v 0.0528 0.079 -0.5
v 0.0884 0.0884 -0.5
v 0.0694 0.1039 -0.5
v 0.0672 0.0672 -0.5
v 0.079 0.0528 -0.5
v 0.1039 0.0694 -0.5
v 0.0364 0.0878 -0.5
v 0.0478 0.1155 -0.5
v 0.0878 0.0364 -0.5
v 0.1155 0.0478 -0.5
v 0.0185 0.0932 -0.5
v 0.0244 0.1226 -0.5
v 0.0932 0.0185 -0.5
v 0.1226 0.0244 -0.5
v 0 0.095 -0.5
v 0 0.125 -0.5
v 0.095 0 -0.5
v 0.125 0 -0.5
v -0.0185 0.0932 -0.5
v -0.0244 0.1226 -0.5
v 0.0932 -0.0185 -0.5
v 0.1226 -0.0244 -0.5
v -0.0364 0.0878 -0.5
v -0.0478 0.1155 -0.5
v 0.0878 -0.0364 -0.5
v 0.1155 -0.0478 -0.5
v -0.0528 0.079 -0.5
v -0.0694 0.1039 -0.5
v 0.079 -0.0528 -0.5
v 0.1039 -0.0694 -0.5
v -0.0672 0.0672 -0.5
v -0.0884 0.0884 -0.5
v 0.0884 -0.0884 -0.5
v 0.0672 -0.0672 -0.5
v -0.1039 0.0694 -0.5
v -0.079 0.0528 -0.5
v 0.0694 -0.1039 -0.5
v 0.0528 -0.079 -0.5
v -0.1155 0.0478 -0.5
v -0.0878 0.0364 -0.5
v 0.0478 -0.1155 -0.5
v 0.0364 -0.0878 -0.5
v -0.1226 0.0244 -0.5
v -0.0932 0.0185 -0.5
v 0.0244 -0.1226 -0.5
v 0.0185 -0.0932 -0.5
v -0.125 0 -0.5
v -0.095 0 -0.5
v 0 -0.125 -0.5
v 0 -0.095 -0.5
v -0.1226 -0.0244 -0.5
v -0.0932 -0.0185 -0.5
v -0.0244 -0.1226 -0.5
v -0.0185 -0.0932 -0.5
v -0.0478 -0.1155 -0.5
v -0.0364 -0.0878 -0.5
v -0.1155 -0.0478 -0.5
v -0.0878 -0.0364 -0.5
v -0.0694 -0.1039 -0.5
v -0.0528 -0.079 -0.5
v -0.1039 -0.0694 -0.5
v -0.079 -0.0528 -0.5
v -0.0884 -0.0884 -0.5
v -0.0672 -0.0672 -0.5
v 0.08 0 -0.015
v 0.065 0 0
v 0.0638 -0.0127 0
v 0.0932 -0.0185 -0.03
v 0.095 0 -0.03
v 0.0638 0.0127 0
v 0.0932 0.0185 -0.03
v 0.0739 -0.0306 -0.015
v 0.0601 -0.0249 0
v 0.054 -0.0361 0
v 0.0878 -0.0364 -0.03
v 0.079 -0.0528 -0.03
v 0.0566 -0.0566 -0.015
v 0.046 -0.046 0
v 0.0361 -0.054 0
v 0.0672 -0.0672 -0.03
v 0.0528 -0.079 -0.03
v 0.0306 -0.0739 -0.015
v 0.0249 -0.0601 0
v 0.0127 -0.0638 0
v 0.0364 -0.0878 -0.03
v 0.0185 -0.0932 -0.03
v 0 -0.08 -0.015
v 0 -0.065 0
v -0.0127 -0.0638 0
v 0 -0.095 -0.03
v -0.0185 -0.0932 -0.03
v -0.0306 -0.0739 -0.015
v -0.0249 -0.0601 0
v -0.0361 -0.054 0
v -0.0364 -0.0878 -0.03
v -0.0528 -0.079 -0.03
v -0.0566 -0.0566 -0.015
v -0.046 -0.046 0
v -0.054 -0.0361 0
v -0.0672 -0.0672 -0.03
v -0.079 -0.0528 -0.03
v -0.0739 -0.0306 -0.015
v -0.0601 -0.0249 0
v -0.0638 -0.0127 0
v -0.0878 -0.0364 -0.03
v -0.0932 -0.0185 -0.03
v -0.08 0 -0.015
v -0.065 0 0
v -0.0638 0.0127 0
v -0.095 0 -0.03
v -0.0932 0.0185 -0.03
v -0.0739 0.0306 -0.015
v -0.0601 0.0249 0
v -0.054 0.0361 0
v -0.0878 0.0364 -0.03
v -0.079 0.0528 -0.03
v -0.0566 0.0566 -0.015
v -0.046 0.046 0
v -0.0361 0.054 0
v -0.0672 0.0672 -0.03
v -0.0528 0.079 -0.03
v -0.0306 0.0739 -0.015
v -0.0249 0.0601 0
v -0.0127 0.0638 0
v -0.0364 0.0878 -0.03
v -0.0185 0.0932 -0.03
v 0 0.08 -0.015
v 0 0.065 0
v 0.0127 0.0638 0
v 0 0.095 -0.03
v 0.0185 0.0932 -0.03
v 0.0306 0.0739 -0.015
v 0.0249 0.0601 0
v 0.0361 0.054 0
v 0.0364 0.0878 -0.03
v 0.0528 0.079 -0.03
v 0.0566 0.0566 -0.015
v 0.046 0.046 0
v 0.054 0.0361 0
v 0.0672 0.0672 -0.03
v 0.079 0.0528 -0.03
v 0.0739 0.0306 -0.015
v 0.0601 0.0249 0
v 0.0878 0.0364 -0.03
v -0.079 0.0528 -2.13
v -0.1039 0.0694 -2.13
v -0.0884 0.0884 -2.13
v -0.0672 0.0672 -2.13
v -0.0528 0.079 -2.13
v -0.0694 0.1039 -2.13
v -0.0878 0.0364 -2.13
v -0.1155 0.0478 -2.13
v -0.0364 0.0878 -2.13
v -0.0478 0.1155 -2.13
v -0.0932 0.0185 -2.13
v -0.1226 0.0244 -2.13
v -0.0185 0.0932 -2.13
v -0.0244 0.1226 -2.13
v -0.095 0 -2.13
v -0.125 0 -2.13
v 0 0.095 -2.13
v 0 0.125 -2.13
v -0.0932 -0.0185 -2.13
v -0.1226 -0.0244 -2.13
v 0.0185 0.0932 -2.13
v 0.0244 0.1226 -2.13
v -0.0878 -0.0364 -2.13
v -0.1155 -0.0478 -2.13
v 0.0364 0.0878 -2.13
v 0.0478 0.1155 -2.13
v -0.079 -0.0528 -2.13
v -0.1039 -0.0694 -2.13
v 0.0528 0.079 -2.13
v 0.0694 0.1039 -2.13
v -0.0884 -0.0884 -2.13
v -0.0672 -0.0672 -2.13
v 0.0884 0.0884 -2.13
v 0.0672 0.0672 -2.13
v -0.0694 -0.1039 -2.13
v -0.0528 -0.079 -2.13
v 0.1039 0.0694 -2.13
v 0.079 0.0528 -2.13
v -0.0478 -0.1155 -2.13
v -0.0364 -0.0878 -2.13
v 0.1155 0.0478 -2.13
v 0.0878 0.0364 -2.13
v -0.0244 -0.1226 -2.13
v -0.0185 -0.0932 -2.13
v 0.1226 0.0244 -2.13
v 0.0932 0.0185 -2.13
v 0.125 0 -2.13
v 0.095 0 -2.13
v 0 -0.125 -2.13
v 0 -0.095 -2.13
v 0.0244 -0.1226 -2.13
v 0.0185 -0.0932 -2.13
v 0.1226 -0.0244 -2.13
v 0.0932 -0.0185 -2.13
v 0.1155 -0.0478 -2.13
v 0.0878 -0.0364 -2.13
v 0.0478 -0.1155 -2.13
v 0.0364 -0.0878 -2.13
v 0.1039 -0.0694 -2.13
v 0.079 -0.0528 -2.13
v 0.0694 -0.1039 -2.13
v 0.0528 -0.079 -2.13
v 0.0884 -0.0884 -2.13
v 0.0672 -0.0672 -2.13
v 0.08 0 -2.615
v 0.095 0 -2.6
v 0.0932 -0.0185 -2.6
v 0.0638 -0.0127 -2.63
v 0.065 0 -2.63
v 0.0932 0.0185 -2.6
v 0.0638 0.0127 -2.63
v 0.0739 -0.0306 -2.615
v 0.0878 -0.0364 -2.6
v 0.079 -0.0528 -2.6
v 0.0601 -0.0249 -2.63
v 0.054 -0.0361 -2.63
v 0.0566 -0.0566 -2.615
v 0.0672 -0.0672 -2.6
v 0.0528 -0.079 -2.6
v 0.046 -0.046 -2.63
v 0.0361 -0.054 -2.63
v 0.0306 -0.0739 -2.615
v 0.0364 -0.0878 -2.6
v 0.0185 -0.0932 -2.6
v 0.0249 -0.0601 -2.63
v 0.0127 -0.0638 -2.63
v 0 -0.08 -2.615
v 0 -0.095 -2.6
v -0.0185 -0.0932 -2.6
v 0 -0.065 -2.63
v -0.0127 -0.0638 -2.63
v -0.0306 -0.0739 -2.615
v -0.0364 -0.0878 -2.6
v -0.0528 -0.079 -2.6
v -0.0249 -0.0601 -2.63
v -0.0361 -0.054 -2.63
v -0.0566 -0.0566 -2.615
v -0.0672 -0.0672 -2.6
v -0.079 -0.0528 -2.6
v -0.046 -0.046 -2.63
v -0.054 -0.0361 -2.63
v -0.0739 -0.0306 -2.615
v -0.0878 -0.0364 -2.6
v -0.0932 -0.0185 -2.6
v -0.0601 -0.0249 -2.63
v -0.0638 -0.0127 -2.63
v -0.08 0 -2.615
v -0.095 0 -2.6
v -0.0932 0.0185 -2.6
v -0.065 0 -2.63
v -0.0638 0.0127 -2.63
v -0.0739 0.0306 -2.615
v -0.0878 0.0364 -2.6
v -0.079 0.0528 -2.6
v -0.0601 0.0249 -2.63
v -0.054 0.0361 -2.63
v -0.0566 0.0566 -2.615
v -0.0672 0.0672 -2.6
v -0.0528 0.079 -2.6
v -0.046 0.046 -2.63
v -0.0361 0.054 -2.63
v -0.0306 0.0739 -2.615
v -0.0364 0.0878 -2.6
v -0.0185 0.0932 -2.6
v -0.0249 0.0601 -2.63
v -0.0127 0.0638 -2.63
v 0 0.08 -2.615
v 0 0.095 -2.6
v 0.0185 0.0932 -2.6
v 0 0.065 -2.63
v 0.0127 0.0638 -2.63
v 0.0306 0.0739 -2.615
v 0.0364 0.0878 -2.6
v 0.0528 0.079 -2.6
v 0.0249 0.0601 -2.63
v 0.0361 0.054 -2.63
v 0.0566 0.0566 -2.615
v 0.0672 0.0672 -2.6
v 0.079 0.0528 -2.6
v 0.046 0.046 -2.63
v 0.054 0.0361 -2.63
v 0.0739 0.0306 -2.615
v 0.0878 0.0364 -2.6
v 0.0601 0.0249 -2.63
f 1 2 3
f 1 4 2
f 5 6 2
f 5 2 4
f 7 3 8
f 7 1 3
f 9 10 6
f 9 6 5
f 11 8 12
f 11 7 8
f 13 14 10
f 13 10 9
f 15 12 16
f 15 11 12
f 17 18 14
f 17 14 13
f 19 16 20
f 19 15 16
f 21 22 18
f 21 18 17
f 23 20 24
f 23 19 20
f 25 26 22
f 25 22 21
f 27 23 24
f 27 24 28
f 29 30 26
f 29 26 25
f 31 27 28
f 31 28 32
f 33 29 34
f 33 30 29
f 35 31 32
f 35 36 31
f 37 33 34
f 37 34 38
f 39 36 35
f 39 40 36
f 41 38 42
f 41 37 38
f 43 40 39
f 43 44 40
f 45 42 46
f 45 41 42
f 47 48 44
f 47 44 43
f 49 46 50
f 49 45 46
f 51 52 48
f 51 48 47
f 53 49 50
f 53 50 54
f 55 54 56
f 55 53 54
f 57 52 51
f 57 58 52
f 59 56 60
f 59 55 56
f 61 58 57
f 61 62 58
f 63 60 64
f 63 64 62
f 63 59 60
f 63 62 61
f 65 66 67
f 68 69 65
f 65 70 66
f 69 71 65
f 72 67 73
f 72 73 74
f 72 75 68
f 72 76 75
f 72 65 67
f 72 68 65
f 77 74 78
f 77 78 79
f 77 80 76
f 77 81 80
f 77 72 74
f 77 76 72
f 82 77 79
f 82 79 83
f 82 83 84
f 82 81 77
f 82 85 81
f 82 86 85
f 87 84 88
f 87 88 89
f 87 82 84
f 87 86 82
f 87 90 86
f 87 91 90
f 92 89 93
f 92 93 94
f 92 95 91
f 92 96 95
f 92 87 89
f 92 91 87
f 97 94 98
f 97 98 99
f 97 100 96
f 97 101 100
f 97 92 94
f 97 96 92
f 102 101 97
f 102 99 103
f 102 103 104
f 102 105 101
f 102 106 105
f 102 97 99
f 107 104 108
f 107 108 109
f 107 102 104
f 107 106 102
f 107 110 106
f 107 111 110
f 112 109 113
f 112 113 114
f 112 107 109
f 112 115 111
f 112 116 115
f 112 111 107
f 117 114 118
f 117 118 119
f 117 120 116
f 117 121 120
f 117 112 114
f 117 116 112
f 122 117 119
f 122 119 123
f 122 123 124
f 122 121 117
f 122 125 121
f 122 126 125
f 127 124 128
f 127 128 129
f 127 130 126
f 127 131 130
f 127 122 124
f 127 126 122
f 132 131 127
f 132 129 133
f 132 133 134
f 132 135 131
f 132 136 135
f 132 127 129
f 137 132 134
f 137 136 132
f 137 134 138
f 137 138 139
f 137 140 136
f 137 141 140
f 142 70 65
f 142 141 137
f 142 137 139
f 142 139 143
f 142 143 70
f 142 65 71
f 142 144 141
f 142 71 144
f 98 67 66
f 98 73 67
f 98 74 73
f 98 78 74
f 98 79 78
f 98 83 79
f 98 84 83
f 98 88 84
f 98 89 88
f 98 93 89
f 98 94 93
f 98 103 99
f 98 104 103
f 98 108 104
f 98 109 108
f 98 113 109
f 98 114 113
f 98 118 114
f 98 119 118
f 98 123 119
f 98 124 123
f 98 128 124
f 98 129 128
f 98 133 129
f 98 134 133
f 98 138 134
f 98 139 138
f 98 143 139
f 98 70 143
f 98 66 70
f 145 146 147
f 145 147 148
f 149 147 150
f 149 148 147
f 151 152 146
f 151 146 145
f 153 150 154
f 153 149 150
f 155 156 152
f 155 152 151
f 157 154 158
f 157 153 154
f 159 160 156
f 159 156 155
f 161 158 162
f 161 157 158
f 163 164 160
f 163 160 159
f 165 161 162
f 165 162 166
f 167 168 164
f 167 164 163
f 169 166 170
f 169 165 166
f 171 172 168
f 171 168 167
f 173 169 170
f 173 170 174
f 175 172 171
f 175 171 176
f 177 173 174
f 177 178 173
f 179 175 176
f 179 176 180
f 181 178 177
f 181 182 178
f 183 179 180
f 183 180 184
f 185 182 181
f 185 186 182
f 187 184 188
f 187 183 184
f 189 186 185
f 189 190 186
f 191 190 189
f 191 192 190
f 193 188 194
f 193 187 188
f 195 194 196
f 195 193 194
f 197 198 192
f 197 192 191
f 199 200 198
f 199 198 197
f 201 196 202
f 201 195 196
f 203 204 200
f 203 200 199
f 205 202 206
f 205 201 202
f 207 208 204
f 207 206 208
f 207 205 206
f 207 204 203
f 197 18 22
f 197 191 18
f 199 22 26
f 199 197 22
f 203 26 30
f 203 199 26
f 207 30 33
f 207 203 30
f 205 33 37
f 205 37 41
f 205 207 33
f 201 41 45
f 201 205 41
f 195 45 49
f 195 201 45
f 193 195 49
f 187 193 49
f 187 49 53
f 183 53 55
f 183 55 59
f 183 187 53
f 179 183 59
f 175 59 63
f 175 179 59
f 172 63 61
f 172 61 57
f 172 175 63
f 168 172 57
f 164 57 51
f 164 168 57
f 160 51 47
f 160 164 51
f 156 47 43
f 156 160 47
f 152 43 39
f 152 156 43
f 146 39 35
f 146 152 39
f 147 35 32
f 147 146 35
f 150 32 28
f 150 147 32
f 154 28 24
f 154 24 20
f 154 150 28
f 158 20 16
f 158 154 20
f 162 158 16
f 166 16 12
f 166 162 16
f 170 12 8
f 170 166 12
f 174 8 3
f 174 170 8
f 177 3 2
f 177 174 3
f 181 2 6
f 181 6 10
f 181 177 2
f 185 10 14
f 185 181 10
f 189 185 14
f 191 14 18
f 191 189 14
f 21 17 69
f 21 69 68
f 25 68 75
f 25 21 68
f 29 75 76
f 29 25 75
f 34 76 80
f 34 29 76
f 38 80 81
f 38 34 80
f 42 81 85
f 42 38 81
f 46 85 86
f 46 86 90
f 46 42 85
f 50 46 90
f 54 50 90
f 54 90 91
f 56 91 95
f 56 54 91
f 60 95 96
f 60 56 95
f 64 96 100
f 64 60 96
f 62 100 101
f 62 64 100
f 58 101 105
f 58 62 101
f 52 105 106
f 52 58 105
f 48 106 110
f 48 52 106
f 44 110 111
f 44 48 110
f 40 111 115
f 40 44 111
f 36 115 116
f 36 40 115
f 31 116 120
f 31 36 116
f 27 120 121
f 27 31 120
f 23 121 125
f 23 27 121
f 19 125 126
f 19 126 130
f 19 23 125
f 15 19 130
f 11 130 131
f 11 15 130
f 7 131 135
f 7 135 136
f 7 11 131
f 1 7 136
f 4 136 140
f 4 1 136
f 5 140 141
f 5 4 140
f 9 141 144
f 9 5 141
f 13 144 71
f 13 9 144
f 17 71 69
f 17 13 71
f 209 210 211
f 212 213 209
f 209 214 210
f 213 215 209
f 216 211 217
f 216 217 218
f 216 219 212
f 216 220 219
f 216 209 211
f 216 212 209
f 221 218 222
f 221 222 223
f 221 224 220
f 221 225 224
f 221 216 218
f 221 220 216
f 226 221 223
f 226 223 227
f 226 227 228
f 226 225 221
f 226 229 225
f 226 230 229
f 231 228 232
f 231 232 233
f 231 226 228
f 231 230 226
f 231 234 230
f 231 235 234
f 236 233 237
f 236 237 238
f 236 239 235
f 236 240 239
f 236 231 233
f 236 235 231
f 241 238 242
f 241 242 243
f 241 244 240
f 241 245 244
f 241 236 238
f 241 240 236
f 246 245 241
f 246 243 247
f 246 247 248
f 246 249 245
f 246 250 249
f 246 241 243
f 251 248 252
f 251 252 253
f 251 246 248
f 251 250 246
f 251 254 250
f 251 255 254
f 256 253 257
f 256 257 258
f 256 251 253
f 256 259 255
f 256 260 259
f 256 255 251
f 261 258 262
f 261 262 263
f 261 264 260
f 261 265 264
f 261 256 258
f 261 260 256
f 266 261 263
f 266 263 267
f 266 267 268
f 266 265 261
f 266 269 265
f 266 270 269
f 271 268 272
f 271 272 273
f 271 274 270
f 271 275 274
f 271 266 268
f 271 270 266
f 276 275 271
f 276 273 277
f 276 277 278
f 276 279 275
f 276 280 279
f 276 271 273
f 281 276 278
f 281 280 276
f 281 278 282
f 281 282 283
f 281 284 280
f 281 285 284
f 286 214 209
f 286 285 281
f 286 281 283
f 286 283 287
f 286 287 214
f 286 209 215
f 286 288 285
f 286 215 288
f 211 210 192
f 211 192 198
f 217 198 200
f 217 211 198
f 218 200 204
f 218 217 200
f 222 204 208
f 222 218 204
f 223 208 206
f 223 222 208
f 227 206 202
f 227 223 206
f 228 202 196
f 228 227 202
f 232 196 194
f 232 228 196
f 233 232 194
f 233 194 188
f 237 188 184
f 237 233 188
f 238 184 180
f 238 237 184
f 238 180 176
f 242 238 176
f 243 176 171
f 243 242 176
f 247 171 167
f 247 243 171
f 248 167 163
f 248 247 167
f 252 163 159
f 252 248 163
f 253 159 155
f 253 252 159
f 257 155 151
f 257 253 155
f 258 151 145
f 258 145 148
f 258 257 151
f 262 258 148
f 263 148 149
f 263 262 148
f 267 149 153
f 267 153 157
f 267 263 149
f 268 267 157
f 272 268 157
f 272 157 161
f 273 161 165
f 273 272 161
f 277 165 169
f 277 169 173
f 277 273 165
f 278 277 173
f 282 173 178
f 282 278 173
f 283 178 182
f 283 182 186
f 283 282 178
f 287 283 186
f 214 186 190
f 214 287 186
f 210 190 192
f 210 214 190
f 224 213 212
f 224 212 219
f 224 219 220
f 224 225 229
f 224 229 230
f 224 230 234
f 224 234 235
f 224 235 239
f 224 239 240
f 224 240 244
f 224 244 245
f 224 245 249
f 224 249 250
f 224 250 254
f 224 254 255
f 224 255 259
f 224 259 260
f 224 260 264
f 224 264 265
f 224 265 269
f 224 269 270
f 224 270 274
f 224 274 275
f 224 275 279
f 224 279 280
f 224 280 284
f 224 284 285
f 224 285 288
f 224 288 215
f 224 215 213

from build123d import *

# Parameters (mm, degrees)
CHAMFER1_SIZE = 0.03


with BuildPart() as part:
    # Sketch2 → Revolve1 (revolve)
    with BuildSketch(Plane(origin=(0, 0, 0), x_dir=(1, 0, 0), z_dir=(0, 1, 0))):
        Polygon((0, 0), (0.095, 0), (0.095, 0.5), (0.125, 0.5), (0.125, 2.13), (0.095, 2.13), (0.095, 2.63), (0, 2.63), align=None)
    revolve(axis=Axis((0, 0, 0), (0, 0, -1)))

    # Chamfer1
    chamfer1_edges = [part.edges().sort_by_distance(p)[0] for p in [
        (-0.095, 0, -2.63),
        (-0.095, 0, 0),
    ]]
    chamfer(chamfer1_edges, length=CHAMFER1_SIZE)


solid = part.part
